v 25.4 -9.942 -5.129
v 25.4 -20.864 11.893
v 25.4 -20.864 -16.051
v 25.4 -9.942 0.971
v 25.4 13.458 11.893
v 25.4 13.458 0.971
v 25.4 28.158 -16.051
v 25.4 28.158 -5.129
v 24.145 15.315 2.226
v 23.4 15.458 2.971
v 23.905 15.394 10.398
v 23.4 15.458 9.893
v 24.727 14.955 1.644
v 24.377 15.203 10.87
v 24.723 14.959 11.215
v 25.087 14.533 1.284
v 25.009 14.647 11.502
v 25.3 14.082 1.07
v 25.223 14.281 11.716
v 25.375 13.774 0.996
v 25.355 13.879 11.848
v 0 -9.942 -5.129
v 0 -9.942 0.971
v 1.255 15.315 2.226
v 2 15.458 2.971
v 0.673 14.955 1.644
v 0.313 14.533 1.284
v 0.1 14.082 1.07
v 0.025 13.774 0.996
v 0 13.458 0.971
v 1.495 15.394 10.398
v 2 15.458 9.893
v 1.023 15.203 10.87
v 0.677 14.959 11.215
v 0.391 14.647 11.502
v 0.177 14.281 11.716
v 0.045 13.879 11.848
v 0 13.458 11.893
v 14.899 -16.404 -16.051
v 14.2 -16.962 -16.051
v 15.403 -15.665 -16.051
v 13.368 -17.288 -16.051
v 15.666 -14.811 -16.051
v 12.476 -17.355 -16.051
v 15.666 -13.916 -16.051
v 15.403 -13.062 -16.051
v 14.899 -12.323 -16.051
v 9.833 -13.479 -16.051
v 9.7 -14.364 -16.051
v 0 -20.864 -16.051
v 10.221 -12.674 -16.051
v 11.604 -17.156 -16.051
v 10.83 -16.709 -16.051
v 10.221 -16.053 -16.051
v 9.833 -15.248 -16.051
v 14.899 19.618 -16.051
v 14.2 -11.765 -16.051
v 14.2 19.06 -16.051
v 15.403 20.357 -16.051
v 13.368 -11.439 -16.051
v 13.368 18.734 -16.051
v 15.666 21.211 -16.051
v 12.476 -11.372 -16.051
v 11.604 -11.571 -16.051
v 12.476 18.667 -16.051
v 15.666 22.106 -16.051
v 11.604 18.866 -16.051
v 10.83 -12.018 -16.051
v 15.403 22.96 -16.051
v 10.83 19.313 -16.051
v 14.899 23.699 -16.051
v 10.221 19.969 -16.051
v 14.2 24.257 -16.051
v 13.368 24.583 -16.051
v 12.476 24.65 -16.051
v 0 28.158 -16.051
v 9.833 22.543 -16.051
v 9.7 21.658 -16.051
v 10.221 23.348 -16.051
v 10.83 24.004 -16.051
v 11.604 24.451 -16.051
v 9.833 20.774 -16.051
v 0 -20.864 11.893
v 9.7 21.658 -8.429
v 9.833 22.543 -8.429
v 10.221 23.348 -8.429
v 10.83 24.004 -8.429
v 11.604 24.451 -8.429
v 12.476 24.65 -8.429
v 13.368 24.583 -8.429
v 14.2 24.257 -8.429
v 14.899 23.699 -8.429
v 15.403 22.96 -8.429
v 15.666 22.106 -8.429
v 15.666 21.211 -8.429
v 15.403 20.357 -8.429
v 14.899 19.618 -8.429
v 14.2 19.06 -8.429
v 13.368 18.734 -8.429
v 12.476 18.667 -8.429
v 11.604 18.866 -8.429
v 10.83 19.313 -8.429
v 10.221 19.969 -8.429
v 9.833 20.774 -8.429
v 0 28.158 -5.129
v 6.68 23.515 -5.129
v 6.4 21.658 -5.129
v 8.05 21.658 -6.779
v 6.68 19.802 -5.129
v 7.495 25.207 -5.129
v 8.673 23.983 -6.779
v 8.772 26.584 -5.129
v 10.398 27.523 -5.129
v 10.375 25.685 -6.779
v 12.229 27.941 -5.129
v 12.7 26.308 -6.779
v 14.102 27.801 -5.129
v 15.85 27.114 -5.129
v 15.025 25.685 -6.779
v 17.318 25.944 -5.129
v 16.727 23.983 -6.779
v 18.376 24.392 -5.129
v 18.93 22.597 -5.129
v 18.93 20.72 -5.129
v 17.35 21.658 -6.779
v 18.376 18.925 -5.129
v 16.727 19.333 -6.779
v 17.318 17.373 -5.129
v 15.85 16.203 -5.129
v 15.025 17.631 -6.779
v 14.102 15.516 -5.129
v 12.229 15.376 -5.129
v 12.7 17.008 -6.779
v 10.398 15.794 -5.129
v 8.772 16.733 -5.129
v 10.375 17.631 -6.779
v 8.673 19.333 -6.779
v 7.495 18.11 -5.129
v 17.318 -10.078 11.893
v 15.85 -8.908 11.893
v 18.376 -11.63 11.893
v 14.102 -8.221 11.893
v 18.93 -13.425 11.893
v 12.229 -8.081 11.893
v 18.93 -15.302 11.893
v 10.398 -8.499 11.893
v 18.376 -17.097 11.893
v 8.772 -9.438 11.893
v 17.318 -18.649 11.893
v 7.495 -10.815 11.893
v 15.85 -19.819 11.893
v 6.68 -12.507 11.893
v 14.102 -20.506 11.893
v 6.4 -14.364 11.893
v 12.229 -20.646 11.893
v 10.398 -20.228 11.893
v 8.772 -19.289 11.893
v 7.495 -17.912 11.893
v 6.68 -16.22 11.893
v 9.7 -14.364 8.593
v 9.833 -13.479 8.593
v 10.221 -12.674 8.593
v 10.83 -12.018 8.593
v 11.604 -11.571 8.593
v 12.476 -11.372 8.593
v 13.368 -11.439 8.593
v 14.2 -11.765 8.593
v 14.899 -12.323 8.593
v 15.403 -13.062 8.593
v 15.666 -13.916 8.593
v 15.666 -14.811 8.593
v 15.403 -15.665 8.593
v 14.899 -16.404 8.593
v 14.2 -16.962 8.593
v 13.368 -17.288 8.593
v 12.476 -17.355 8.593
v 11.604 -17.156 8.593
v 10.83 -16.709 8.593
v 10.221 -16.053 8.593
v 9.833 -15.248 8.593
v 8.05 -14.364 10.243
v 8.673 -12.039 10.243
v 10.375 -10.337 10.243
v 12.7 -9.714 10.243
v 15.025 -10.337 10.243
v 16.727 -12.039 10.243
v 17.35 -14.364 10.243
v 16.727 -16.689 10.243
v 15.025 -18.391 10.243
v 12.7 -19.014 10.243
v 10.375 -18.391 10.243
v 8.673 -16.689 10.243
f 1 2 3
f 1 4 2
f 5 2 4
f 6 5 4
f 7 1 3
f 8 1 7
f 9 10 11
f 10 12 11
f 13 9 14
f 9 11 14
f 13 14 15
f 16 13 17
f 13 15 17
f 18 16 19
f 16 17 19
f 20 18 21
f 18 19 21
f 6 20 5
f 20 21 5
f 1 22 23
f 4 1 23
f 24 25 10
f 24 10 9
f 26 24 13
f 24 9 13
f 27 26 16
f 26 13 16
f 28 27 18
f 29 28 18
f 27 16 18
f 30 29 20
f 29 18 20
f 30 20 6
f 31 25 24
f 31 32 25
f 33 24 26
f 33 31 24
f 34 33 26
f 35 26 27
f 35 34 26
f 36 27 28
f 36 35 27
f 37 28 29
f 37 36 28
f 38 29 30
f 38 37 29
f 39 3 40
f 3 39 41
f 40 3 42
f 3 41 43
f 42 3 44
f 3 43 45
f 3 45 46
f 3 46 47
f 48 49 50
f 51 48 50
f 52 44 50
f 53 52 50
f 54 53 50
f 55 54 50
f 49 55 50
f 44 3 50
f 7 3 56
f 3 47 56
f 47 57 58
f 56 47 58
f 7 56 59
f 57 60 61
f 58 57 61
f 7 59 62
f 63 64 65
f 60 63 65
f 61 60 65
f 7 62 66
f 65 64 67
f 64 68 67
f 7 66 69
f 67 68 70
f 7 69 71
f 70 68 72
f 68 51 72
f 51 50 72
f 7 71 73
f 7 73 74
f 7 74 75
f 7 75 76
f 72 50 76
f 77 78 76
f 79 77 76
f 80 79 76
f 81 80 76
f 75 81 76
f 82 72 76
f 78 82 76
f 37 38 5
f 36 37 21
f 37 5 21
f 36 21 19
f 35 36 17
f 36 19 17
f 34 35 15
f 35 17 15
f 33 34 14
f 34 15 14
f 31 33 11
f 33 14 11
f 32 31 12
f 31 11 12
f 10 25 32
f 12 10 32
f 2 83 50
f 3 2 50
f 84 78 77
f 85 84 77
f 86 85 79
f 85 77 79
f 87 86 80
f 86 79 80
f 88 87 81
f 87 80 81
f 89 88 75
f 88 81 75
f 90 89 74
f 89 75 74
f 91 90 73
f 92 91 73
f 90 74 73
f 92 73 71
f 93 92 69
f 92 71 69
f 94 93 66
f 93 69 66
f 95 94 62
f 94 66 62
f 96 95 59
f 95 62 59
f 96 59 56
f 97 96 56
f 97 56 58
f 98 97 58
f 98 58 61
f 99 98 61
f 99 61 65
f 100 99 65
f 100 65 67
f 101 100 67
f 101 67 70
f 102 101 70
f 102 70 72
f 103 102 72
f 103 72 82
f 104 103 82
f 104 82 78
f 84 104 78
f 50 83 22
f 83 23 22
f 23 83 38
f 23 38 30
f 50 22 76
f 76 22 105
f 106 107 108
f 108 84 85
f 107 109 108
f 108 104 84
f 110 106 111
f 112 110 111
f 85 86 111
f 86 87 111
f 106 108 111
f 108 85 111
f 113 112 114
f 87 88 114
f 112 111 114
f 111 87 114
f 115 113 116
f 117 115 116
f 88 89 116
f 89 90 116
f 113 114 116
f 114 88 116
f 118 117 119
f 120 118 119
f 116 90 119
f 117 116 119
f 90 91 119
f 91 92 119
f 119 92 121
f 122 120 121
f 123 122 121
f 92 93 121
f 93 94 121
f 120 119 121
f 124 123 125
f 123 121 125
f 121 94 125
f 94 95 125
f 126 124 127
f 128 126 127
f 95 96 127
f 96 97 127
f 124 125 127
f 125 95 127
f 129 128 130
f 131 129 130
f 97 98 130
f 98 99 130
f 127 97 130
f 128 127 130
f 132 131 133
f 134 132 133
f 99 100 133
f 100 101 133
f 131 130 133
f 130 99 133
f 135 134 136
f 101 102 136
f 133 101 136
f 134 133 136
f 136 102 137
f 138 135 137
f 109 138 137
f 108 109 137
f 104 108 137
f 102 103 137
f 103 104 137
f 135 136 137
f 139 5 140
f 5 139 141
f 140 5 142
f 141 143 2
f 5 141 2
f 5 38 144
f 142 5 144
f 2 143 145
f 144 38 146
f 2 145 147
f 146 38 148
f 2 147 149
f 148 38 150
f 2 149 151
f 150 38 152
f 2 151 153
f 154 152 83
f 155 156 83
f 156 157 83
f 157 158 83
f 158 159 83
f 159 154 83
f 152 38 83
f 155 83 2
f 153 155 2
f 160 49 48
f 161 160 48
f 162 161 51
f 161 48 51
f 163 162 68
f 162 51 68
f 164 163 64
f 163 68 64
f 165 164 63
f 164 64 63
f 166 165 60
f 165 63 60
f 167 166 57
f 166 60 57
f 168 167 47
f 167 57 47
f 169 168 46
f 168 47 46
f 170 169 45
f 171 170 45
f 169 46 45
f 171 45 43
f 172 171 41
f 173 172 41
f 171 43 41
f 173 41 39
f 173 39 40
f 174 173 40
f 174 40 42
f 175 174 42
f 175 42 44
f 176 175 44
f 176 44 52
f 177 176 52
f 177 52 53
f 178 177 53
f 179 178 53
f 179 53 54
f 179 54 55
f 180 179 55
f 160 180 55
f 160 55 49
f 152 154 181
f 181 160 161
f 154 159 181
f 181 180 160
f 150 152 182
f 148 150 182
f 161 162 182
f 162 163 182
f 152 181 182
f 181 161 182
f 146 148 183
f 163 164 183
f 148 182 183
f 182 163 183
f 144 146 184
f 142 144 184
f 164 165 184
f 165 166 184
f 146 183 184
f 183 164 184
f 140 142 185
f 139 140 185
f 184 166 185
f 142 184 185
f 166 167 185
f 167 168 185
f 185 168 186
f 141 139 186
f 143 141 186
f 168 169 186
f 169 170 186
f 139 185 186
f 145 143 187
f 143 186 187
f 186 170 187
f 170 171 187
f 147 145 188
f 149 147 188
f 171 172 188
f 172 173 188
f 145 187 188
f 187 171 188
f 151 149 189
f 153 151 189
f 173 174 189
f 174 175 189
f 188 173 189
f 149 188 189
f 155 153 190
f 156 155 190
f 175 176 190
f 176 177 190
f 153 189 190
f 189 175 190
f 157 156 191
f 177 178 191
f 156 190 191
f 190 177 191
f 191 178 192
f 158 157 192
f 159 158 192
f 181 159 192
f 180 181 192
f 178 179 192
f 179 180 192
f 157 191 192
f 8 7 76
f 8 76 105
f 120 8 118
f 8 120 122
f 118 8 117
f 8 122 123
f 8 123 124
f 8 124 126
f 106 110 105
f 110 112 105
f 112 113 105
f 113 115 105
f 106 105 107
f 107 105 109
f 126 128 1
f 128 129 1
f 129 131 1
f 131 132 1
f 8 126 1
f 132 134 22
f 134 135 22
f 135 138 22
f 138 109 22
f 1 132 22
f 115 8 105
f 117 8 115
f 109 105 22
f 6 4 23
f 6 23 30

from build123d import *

# Parameters (mm, degrees)
BOSS_EXTRUDE1_DEPTH = 25.4
SKETCH2_R           = 3
CUT_EXTRUDE1_DEPTH  = 28.944
CHAMFER1_SIZE       = 3.3
FILLET1_R           = 2


with BuildPart() as part:
    # Sketch1 → Boss-Extrude1 (new body)
    with BuildSketch(Plane(origin=(0, 0, 0), x_dir=(0, 0, -1), z_dir=(1, 0, 0))):
        Polygon((-0.970833333, 15.458470238), (-11.892833333, 15.458470238), (-11.892833333, -20.863529762), (16.051166667, -20.863529762), (16.051166667, 28.158470238), (5.129166667, 28.158470238), (5.129166667, -9.941529762), (-0.970833333, -9.941529762), align=None)
    extrude(amount=BOSS_EXTRUDE1_DEPTH)

    # Sketch2 → Cut-Extrude1 (cut, through all)
    with BuildSketch(Plane(origin=(0, 0, -16.051166667), x_dir=(-1, 0, 0), z_dir=(0, 0, -1))):
        with Locations((-12.7, 21.658470238)):
            Circle(SKETCH2_R)
        with Locations((-12.7, -14.363529762)):
            Circle(SKETCH2_R)
    extrude(amount=-CUT_EXTRUDE1_DEPTH, mode=Mode.SUBTRACT)

    # Chamfer1
    chamfer1_edges = [part.edges().sort_by_distance(p)[0] for p in [
        (15.7, 21.658470238, -5.129166667),
        (15.7, -14.363529762, 11.892833333),
    ]]
    chamfer(chamfer1_edges, length=CHAMFER1_SIZE)

    # Fillet1
    fillet1_edges = [part.edges().sort_by_distance(p)[0] for p in [
        (12.7, 15.458470238, 11.892833333),
        (12.7, 15.458470238, 0.970833333),
        (25.4, 15.458470238, 6.431833333),
        (0, 15.458470238, 6.431833333),
    ]]
    fillet(fillet1_edges, radius=FILLET1_R)


solid = part.part
